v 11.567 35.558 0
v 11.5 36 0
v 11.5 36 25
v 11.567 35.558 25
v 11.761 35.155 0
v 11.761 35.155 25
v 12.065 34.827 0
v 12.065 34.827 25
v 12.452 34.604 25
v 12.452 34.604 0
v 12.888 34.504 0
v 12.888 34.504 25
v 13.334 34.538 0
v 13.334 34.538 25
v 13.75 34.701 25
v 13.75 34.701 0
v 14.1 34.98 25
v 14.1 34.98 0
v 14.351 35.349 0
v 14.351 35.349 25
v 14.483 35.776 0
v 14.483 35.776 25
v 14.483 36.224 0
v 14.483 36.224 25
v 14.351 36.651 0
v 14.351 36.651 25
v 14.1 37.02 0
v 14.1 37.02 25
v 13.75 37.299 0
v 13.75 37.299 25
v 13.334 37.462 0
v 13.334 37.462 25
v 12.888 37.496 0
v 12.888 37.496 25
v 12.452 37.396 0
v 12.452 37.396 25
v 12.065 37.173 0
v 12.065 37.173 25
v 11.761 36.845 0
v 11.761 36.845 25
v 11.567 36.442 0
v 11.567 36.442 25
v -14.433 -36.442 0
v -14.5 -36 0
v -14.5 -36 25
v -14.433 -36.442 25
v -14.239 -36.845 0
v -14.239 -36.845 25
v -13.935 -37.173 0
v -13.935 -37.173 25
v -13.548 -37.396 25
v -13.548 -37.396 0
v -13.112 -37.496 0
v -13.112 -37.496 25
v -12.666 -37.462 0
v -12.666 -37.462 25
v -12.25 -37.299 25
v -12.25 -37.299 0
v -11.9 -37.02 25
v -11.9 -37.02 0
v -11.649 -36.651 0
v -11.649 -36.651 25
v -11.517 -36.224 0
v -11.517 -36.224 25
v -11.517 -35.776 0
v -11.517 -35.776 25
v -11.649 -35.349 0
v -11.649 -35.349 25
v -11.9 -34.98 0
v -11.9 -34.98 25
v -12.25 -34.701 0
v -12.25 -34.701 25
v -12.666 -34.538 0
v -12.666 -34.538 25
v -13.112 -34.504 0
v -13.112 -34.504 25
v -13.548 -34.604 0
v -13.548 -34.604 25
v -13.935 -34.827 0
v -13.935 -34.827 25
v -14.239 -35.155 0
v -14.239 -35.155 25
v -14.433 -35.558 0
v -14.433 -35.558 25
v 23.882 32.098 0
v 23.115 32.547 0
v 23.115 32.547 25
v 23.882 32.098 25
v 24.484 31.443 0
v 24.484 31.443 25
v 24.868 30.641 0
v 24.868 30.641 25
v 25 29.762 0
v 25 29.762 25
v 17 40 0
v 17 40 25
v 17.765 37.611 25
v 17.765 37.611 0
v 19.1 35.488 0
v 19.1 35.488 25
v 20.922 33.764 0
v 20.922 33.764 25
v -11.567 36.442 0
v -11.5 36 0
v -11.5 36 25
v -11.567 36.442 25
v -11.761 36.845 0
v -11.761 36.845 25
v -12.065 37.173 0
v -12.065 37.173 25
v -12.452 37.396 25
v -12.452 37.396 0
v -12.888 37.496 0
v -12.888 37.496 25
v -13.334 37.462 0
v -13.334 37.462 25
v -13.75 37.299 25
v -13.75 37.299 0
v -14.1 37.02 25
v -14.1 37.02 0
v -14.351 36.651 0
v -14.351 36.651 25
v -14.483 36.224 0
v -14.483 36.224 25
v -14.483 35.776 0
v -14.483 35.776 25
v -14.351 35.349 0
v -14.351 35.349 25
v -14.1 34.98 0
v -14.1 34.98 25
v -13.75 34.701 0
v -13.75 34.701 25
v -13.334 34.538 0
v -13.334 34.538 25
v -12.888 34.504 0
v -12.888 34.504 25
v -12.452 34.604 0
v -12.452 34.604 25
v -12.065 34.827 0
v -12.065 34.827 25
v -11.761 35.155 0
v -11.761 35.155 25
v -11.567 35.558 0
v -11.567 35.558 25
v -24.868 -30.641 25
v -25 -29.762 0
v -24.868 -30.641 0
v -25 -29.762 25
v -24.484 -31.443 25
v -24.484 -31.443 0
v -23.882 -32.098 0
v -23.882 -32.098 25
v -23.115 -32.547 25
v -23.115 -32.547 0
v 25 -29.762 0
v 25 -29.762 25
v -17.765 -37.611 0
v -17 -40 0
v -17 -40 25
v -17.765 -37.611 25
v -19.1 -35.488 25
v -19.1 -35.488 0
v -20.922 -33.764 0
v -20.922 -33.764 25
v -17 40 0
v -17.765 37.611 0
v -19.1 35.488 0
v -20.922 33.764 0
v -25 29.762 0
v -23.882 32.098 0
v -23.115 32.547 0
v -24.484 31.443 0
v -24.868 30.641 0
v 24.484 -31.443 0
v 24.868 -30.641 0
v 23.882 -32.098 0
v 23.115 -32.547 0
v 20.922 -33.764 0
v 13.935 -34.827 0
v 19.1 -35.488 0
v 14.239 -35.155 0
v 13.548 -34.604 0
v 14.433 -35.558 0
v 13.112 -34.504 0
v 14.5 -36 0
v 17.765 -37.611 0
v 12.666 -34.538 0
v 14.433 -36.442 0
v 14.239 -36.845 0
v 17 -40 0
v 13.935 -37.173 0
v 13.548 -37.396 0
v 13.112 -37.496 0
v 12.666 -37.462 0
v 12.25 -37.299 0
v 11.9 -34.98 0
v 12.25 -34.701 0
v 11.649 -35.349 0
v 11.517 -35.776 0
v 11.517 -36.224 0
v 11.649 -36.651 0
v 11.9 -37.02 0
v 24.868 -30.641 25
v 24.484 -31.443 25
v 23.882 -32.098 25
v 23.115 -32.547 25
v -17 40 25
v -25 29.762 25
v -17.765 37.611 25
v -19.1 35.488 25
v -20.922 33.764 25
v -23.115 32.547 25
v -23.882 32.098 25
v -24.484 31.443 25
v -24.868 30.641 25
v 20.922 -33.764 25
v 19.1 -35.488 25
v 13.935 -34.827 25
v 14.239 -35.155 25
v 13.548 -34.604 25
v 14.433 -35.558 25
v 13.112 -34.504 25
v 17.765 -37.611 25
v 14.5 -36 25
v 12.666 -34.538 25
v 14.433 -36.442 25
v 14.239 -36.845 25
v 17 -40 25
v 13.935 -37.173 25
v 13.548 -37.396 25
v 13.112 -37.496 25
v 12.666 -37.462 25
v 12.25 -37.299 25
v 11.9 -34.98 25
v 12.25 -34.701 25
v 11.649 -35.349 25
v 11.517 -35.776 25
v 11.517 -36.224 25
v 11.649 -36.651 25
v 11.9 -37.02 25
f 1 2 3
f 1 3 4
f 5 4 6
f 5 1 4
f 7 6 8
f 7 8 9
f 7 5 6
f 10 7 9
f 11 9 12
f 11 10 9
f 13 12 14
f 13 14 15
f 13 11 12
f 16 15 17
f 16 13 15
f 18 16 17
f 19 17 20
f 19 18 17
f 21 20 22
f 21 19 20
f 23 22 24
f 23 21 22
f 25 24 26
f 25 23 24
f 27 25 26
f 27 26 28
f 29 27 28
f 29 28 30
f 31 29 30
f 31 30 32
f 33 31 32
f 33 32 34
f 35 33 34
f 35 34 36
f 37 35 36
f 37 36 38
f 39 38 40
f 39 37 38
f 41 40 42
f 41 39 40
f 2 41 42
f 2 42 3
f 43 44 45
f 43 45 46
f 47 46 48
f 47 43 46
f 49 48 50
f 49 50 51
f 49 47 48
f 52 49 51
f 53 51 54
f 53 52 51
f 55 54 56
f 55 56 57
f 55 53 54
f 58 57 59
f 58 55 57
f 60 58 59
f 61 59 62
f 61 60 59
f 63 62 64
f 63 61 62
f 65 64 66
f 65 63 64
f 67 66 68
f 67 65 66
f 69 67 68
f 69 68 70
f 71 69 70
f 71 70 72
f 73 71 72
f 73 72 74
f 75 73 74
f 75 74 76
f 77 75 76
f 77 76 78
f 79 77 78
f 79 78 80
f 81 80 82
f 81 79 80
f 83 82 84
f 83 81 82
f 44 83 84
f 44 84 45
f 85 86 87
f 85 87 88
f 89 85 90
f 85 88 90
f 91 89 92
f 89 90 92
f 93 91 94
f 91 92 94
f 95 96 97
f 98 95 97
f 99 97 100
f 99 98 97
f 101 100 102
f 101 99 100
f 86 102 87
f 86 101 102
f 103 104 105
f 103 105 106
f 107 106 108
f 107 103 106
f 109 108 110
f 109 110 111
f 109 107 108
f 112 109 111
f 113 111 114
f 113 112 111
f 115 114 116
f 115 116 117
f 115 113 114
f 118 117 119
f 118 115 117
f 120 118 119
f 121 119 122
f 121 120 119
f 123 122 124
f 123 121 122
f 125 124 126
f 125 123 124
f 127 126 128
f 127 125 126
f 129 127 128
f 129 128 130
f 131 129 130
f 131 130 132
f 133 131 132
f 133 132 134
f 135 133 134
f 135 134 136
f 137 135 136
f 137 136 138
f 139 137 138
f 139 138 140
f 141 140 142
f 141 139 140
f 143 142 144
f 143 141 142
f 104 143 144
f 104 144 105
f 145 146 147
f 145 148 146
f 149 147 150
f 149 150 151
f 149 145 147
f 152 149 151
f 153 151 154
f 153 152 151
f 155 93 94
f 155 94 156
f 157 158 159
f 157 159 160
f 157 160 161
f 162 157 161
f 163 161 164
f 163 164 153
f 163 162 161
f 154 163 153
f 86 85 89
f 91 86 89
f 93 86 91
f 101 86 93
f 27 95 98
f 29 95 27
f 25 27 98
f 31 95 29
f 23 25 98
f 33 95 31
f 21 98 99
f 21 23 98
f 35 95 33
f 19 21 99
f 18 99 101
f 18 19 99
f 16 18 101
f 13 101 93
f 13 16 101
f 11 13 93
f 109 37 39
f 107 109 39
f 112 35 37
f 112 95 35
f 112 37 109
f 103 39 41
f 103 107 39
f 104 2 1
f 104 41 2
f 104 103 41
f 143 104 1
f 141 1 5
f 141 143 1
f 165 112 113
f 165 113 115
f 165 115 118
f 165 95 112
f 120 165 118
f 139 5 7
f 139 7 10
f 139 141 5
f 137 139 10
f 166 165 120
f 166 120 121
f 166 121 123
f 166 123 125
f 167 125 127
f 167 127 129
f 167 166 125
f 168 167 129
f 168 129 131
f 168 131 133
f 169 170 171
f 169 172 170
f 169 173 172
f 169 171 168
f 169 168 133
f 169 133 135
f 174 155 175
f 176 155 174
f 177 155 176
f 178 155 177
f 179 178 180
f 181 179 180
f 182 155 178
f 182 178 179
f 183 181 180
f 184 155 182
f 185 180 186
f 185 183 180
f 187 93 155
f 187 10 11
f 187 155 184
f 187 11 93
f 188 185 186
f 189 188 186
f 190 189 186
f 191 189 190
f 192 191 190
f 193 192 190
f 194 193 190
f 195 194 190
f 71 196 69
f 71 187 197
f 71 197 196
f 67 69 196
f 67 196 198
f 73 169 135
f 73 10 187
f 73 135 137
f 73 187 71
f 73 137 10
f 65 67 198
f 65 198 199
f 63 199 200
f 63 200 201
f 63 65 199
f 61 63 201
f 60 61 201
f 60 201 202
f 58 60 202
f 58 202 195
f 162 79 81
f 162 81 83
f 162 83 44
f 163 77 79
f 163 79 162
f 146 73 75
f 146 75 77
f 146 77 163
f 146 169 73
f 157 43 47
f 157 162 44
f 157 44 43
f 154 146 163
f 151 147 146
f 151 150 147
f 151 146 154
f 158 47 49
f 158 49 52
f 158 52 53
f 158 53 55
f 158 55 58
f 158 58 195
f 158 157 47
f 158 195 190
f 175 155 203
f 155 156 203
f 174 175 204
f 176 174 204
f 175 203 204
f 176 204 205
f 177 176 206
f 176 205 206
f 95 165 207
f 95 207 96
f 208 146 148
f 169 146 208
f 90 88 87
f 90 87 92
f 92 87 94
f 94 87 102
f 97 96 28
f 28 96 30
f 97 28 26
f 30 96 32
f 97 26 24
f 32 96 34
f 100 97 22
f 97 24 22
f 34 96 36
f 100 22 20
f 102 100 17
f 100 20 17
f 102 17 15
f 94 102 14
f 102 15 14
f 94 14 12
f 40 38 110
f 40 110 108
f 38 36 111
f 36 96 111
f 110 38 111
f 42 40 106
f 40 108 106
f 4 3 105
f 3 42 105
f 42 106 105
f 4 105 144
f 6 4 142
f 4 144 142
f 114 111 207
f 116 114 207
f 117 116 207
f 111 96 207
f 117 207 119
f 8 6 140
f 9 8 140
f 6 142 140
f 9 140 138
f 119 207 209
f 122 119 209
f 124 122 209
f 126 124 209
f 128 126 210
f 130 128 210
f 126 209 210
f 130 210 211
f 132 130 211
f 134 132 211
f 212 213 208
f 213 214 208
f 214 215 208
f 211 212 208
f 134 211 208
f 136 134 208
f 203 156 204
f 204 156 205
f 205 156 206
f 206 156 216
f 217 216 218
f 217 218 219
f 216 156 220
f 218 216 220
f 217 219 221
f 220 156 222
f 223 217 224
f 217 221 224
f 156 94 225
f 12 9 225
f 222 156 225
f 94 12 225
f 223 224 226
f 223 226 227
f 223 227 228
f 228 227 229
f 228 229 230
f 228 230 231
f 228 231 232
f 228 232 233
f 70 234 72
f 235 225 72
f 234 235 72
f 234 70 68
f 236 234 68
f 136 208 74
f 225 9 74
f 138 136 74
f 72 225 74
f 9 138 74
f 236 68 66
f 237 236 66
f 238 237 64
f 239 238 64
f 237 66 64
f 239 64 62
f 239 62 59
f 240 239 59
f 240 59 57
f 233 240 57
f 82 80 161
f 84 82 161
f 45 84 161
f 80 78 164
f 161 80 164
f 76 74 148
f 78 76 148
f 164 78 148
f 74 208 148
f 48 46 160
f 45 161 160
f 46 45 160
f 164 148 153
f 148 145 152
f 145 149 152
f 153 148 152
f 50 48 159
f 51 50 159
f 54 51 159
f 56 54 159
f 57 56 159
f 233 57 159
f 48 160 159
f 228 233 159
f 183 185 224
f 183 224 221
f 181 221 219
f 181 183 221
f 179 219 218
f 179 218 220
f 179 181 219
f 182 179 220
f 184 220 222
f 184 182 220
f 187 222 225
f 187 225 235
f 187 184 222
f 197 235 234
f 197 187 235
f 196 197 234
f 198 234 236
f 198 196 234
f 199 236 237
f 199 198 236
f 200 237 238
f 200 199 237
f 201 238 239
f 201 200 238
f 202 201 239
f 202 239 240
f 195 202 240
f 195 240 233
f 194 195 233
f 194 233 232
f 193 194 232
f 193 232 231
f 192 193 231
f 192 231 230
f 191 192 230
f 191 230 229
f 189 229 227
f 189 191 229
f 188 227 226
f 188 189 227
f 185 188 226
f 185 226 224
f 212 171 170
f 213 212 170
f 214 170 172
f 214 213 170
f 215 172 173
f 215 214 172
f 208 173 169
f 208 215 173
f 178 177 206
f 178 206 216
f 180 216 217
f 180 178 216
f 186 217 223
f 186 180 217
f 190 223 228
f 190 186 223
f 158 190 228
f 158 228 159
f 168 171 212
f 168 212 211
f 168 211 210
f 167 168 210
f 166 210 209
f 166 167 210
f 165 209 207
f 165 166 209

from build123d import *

# Parameters (mm, degrees)
SKETCH_1_R      = 1.5
EXTRUDE_1_DEPTH = 25
FILLET_1_R      = 10
FILLET_2_R      = 3


with BuildPart() as part:
    # 草图1 → 凸台-拉伸1 (new body)
    with BuildSketch(Plane.XY):
        Polygon((-17, 40), (17, 40), (17, 32), (25, 32), (25, -32), (17, -32), (17, -40), (-17, -40), (-17, -32), (-25, -32), (-25, 32), (-17, 32), align=None)
        with Locations((-13, 36)):
            Circle(SKETCH_1_R, mode=Mode.SUBTRACT)
        with Locations(Location((13, 36, 0), (0, 0, 180))):
            Circle(SKETCH_1_R, mode=Mode.SUBTRACT)
        with Locations(Location((-13, -36, 0), (0, 0, 180))):
            Circle(SKETCH_1_R, mode=Mode.SUBTRACT)
        with Locations((13, -36)):
            Circle(SKETCH_1_R, mode=Mode.SUBTRACT)
    extrude(amount=EXTRUDE_1_DEPTH)

    # 圆角1
    # the kernel refuses this fillet: 10 mm, written as the material it adds along each edge
    with BuildSketch(Plane(origin=(17, 32, 0), x_dir=(0, 1, 0), z_dir=(0, 0, 1)), Plane(origin=(-17, 32, 0), x_dir=(-1, 0, 0), z_dir=(0, 0, 1)), Plane(origin=(17, -32, 0), x_dir=(1, 0, 0), z_dir=(0, 0, 1)), Plane(origin=(-17, -32, 0), x_dir=(0, -1, 0), z_dir=(0, 0, 1))) as fillet_1_piece_1:
        with BuildLine():
            CenterArc((9.830951895, -9.830951895), FILLET_1_R, 100.550098012, 68.899803976)
            Line((0, -8), (0, 0))
            Line((0, 0), (8, 0))
        make_face()
    extrude(amount=25)

    # 圆角2
    fillet_2_edges = [part.edges().sort_by_distance(p)[0] for p in [
        (25, 32, 12.5),
        (25, -32, 12.5),
        (-25, -32, 12.5),
        (-25, 32, 12.5),
    ]]
    fillet(fillet_2_edges, radius=FILLET_2_R)


solid = part.part
